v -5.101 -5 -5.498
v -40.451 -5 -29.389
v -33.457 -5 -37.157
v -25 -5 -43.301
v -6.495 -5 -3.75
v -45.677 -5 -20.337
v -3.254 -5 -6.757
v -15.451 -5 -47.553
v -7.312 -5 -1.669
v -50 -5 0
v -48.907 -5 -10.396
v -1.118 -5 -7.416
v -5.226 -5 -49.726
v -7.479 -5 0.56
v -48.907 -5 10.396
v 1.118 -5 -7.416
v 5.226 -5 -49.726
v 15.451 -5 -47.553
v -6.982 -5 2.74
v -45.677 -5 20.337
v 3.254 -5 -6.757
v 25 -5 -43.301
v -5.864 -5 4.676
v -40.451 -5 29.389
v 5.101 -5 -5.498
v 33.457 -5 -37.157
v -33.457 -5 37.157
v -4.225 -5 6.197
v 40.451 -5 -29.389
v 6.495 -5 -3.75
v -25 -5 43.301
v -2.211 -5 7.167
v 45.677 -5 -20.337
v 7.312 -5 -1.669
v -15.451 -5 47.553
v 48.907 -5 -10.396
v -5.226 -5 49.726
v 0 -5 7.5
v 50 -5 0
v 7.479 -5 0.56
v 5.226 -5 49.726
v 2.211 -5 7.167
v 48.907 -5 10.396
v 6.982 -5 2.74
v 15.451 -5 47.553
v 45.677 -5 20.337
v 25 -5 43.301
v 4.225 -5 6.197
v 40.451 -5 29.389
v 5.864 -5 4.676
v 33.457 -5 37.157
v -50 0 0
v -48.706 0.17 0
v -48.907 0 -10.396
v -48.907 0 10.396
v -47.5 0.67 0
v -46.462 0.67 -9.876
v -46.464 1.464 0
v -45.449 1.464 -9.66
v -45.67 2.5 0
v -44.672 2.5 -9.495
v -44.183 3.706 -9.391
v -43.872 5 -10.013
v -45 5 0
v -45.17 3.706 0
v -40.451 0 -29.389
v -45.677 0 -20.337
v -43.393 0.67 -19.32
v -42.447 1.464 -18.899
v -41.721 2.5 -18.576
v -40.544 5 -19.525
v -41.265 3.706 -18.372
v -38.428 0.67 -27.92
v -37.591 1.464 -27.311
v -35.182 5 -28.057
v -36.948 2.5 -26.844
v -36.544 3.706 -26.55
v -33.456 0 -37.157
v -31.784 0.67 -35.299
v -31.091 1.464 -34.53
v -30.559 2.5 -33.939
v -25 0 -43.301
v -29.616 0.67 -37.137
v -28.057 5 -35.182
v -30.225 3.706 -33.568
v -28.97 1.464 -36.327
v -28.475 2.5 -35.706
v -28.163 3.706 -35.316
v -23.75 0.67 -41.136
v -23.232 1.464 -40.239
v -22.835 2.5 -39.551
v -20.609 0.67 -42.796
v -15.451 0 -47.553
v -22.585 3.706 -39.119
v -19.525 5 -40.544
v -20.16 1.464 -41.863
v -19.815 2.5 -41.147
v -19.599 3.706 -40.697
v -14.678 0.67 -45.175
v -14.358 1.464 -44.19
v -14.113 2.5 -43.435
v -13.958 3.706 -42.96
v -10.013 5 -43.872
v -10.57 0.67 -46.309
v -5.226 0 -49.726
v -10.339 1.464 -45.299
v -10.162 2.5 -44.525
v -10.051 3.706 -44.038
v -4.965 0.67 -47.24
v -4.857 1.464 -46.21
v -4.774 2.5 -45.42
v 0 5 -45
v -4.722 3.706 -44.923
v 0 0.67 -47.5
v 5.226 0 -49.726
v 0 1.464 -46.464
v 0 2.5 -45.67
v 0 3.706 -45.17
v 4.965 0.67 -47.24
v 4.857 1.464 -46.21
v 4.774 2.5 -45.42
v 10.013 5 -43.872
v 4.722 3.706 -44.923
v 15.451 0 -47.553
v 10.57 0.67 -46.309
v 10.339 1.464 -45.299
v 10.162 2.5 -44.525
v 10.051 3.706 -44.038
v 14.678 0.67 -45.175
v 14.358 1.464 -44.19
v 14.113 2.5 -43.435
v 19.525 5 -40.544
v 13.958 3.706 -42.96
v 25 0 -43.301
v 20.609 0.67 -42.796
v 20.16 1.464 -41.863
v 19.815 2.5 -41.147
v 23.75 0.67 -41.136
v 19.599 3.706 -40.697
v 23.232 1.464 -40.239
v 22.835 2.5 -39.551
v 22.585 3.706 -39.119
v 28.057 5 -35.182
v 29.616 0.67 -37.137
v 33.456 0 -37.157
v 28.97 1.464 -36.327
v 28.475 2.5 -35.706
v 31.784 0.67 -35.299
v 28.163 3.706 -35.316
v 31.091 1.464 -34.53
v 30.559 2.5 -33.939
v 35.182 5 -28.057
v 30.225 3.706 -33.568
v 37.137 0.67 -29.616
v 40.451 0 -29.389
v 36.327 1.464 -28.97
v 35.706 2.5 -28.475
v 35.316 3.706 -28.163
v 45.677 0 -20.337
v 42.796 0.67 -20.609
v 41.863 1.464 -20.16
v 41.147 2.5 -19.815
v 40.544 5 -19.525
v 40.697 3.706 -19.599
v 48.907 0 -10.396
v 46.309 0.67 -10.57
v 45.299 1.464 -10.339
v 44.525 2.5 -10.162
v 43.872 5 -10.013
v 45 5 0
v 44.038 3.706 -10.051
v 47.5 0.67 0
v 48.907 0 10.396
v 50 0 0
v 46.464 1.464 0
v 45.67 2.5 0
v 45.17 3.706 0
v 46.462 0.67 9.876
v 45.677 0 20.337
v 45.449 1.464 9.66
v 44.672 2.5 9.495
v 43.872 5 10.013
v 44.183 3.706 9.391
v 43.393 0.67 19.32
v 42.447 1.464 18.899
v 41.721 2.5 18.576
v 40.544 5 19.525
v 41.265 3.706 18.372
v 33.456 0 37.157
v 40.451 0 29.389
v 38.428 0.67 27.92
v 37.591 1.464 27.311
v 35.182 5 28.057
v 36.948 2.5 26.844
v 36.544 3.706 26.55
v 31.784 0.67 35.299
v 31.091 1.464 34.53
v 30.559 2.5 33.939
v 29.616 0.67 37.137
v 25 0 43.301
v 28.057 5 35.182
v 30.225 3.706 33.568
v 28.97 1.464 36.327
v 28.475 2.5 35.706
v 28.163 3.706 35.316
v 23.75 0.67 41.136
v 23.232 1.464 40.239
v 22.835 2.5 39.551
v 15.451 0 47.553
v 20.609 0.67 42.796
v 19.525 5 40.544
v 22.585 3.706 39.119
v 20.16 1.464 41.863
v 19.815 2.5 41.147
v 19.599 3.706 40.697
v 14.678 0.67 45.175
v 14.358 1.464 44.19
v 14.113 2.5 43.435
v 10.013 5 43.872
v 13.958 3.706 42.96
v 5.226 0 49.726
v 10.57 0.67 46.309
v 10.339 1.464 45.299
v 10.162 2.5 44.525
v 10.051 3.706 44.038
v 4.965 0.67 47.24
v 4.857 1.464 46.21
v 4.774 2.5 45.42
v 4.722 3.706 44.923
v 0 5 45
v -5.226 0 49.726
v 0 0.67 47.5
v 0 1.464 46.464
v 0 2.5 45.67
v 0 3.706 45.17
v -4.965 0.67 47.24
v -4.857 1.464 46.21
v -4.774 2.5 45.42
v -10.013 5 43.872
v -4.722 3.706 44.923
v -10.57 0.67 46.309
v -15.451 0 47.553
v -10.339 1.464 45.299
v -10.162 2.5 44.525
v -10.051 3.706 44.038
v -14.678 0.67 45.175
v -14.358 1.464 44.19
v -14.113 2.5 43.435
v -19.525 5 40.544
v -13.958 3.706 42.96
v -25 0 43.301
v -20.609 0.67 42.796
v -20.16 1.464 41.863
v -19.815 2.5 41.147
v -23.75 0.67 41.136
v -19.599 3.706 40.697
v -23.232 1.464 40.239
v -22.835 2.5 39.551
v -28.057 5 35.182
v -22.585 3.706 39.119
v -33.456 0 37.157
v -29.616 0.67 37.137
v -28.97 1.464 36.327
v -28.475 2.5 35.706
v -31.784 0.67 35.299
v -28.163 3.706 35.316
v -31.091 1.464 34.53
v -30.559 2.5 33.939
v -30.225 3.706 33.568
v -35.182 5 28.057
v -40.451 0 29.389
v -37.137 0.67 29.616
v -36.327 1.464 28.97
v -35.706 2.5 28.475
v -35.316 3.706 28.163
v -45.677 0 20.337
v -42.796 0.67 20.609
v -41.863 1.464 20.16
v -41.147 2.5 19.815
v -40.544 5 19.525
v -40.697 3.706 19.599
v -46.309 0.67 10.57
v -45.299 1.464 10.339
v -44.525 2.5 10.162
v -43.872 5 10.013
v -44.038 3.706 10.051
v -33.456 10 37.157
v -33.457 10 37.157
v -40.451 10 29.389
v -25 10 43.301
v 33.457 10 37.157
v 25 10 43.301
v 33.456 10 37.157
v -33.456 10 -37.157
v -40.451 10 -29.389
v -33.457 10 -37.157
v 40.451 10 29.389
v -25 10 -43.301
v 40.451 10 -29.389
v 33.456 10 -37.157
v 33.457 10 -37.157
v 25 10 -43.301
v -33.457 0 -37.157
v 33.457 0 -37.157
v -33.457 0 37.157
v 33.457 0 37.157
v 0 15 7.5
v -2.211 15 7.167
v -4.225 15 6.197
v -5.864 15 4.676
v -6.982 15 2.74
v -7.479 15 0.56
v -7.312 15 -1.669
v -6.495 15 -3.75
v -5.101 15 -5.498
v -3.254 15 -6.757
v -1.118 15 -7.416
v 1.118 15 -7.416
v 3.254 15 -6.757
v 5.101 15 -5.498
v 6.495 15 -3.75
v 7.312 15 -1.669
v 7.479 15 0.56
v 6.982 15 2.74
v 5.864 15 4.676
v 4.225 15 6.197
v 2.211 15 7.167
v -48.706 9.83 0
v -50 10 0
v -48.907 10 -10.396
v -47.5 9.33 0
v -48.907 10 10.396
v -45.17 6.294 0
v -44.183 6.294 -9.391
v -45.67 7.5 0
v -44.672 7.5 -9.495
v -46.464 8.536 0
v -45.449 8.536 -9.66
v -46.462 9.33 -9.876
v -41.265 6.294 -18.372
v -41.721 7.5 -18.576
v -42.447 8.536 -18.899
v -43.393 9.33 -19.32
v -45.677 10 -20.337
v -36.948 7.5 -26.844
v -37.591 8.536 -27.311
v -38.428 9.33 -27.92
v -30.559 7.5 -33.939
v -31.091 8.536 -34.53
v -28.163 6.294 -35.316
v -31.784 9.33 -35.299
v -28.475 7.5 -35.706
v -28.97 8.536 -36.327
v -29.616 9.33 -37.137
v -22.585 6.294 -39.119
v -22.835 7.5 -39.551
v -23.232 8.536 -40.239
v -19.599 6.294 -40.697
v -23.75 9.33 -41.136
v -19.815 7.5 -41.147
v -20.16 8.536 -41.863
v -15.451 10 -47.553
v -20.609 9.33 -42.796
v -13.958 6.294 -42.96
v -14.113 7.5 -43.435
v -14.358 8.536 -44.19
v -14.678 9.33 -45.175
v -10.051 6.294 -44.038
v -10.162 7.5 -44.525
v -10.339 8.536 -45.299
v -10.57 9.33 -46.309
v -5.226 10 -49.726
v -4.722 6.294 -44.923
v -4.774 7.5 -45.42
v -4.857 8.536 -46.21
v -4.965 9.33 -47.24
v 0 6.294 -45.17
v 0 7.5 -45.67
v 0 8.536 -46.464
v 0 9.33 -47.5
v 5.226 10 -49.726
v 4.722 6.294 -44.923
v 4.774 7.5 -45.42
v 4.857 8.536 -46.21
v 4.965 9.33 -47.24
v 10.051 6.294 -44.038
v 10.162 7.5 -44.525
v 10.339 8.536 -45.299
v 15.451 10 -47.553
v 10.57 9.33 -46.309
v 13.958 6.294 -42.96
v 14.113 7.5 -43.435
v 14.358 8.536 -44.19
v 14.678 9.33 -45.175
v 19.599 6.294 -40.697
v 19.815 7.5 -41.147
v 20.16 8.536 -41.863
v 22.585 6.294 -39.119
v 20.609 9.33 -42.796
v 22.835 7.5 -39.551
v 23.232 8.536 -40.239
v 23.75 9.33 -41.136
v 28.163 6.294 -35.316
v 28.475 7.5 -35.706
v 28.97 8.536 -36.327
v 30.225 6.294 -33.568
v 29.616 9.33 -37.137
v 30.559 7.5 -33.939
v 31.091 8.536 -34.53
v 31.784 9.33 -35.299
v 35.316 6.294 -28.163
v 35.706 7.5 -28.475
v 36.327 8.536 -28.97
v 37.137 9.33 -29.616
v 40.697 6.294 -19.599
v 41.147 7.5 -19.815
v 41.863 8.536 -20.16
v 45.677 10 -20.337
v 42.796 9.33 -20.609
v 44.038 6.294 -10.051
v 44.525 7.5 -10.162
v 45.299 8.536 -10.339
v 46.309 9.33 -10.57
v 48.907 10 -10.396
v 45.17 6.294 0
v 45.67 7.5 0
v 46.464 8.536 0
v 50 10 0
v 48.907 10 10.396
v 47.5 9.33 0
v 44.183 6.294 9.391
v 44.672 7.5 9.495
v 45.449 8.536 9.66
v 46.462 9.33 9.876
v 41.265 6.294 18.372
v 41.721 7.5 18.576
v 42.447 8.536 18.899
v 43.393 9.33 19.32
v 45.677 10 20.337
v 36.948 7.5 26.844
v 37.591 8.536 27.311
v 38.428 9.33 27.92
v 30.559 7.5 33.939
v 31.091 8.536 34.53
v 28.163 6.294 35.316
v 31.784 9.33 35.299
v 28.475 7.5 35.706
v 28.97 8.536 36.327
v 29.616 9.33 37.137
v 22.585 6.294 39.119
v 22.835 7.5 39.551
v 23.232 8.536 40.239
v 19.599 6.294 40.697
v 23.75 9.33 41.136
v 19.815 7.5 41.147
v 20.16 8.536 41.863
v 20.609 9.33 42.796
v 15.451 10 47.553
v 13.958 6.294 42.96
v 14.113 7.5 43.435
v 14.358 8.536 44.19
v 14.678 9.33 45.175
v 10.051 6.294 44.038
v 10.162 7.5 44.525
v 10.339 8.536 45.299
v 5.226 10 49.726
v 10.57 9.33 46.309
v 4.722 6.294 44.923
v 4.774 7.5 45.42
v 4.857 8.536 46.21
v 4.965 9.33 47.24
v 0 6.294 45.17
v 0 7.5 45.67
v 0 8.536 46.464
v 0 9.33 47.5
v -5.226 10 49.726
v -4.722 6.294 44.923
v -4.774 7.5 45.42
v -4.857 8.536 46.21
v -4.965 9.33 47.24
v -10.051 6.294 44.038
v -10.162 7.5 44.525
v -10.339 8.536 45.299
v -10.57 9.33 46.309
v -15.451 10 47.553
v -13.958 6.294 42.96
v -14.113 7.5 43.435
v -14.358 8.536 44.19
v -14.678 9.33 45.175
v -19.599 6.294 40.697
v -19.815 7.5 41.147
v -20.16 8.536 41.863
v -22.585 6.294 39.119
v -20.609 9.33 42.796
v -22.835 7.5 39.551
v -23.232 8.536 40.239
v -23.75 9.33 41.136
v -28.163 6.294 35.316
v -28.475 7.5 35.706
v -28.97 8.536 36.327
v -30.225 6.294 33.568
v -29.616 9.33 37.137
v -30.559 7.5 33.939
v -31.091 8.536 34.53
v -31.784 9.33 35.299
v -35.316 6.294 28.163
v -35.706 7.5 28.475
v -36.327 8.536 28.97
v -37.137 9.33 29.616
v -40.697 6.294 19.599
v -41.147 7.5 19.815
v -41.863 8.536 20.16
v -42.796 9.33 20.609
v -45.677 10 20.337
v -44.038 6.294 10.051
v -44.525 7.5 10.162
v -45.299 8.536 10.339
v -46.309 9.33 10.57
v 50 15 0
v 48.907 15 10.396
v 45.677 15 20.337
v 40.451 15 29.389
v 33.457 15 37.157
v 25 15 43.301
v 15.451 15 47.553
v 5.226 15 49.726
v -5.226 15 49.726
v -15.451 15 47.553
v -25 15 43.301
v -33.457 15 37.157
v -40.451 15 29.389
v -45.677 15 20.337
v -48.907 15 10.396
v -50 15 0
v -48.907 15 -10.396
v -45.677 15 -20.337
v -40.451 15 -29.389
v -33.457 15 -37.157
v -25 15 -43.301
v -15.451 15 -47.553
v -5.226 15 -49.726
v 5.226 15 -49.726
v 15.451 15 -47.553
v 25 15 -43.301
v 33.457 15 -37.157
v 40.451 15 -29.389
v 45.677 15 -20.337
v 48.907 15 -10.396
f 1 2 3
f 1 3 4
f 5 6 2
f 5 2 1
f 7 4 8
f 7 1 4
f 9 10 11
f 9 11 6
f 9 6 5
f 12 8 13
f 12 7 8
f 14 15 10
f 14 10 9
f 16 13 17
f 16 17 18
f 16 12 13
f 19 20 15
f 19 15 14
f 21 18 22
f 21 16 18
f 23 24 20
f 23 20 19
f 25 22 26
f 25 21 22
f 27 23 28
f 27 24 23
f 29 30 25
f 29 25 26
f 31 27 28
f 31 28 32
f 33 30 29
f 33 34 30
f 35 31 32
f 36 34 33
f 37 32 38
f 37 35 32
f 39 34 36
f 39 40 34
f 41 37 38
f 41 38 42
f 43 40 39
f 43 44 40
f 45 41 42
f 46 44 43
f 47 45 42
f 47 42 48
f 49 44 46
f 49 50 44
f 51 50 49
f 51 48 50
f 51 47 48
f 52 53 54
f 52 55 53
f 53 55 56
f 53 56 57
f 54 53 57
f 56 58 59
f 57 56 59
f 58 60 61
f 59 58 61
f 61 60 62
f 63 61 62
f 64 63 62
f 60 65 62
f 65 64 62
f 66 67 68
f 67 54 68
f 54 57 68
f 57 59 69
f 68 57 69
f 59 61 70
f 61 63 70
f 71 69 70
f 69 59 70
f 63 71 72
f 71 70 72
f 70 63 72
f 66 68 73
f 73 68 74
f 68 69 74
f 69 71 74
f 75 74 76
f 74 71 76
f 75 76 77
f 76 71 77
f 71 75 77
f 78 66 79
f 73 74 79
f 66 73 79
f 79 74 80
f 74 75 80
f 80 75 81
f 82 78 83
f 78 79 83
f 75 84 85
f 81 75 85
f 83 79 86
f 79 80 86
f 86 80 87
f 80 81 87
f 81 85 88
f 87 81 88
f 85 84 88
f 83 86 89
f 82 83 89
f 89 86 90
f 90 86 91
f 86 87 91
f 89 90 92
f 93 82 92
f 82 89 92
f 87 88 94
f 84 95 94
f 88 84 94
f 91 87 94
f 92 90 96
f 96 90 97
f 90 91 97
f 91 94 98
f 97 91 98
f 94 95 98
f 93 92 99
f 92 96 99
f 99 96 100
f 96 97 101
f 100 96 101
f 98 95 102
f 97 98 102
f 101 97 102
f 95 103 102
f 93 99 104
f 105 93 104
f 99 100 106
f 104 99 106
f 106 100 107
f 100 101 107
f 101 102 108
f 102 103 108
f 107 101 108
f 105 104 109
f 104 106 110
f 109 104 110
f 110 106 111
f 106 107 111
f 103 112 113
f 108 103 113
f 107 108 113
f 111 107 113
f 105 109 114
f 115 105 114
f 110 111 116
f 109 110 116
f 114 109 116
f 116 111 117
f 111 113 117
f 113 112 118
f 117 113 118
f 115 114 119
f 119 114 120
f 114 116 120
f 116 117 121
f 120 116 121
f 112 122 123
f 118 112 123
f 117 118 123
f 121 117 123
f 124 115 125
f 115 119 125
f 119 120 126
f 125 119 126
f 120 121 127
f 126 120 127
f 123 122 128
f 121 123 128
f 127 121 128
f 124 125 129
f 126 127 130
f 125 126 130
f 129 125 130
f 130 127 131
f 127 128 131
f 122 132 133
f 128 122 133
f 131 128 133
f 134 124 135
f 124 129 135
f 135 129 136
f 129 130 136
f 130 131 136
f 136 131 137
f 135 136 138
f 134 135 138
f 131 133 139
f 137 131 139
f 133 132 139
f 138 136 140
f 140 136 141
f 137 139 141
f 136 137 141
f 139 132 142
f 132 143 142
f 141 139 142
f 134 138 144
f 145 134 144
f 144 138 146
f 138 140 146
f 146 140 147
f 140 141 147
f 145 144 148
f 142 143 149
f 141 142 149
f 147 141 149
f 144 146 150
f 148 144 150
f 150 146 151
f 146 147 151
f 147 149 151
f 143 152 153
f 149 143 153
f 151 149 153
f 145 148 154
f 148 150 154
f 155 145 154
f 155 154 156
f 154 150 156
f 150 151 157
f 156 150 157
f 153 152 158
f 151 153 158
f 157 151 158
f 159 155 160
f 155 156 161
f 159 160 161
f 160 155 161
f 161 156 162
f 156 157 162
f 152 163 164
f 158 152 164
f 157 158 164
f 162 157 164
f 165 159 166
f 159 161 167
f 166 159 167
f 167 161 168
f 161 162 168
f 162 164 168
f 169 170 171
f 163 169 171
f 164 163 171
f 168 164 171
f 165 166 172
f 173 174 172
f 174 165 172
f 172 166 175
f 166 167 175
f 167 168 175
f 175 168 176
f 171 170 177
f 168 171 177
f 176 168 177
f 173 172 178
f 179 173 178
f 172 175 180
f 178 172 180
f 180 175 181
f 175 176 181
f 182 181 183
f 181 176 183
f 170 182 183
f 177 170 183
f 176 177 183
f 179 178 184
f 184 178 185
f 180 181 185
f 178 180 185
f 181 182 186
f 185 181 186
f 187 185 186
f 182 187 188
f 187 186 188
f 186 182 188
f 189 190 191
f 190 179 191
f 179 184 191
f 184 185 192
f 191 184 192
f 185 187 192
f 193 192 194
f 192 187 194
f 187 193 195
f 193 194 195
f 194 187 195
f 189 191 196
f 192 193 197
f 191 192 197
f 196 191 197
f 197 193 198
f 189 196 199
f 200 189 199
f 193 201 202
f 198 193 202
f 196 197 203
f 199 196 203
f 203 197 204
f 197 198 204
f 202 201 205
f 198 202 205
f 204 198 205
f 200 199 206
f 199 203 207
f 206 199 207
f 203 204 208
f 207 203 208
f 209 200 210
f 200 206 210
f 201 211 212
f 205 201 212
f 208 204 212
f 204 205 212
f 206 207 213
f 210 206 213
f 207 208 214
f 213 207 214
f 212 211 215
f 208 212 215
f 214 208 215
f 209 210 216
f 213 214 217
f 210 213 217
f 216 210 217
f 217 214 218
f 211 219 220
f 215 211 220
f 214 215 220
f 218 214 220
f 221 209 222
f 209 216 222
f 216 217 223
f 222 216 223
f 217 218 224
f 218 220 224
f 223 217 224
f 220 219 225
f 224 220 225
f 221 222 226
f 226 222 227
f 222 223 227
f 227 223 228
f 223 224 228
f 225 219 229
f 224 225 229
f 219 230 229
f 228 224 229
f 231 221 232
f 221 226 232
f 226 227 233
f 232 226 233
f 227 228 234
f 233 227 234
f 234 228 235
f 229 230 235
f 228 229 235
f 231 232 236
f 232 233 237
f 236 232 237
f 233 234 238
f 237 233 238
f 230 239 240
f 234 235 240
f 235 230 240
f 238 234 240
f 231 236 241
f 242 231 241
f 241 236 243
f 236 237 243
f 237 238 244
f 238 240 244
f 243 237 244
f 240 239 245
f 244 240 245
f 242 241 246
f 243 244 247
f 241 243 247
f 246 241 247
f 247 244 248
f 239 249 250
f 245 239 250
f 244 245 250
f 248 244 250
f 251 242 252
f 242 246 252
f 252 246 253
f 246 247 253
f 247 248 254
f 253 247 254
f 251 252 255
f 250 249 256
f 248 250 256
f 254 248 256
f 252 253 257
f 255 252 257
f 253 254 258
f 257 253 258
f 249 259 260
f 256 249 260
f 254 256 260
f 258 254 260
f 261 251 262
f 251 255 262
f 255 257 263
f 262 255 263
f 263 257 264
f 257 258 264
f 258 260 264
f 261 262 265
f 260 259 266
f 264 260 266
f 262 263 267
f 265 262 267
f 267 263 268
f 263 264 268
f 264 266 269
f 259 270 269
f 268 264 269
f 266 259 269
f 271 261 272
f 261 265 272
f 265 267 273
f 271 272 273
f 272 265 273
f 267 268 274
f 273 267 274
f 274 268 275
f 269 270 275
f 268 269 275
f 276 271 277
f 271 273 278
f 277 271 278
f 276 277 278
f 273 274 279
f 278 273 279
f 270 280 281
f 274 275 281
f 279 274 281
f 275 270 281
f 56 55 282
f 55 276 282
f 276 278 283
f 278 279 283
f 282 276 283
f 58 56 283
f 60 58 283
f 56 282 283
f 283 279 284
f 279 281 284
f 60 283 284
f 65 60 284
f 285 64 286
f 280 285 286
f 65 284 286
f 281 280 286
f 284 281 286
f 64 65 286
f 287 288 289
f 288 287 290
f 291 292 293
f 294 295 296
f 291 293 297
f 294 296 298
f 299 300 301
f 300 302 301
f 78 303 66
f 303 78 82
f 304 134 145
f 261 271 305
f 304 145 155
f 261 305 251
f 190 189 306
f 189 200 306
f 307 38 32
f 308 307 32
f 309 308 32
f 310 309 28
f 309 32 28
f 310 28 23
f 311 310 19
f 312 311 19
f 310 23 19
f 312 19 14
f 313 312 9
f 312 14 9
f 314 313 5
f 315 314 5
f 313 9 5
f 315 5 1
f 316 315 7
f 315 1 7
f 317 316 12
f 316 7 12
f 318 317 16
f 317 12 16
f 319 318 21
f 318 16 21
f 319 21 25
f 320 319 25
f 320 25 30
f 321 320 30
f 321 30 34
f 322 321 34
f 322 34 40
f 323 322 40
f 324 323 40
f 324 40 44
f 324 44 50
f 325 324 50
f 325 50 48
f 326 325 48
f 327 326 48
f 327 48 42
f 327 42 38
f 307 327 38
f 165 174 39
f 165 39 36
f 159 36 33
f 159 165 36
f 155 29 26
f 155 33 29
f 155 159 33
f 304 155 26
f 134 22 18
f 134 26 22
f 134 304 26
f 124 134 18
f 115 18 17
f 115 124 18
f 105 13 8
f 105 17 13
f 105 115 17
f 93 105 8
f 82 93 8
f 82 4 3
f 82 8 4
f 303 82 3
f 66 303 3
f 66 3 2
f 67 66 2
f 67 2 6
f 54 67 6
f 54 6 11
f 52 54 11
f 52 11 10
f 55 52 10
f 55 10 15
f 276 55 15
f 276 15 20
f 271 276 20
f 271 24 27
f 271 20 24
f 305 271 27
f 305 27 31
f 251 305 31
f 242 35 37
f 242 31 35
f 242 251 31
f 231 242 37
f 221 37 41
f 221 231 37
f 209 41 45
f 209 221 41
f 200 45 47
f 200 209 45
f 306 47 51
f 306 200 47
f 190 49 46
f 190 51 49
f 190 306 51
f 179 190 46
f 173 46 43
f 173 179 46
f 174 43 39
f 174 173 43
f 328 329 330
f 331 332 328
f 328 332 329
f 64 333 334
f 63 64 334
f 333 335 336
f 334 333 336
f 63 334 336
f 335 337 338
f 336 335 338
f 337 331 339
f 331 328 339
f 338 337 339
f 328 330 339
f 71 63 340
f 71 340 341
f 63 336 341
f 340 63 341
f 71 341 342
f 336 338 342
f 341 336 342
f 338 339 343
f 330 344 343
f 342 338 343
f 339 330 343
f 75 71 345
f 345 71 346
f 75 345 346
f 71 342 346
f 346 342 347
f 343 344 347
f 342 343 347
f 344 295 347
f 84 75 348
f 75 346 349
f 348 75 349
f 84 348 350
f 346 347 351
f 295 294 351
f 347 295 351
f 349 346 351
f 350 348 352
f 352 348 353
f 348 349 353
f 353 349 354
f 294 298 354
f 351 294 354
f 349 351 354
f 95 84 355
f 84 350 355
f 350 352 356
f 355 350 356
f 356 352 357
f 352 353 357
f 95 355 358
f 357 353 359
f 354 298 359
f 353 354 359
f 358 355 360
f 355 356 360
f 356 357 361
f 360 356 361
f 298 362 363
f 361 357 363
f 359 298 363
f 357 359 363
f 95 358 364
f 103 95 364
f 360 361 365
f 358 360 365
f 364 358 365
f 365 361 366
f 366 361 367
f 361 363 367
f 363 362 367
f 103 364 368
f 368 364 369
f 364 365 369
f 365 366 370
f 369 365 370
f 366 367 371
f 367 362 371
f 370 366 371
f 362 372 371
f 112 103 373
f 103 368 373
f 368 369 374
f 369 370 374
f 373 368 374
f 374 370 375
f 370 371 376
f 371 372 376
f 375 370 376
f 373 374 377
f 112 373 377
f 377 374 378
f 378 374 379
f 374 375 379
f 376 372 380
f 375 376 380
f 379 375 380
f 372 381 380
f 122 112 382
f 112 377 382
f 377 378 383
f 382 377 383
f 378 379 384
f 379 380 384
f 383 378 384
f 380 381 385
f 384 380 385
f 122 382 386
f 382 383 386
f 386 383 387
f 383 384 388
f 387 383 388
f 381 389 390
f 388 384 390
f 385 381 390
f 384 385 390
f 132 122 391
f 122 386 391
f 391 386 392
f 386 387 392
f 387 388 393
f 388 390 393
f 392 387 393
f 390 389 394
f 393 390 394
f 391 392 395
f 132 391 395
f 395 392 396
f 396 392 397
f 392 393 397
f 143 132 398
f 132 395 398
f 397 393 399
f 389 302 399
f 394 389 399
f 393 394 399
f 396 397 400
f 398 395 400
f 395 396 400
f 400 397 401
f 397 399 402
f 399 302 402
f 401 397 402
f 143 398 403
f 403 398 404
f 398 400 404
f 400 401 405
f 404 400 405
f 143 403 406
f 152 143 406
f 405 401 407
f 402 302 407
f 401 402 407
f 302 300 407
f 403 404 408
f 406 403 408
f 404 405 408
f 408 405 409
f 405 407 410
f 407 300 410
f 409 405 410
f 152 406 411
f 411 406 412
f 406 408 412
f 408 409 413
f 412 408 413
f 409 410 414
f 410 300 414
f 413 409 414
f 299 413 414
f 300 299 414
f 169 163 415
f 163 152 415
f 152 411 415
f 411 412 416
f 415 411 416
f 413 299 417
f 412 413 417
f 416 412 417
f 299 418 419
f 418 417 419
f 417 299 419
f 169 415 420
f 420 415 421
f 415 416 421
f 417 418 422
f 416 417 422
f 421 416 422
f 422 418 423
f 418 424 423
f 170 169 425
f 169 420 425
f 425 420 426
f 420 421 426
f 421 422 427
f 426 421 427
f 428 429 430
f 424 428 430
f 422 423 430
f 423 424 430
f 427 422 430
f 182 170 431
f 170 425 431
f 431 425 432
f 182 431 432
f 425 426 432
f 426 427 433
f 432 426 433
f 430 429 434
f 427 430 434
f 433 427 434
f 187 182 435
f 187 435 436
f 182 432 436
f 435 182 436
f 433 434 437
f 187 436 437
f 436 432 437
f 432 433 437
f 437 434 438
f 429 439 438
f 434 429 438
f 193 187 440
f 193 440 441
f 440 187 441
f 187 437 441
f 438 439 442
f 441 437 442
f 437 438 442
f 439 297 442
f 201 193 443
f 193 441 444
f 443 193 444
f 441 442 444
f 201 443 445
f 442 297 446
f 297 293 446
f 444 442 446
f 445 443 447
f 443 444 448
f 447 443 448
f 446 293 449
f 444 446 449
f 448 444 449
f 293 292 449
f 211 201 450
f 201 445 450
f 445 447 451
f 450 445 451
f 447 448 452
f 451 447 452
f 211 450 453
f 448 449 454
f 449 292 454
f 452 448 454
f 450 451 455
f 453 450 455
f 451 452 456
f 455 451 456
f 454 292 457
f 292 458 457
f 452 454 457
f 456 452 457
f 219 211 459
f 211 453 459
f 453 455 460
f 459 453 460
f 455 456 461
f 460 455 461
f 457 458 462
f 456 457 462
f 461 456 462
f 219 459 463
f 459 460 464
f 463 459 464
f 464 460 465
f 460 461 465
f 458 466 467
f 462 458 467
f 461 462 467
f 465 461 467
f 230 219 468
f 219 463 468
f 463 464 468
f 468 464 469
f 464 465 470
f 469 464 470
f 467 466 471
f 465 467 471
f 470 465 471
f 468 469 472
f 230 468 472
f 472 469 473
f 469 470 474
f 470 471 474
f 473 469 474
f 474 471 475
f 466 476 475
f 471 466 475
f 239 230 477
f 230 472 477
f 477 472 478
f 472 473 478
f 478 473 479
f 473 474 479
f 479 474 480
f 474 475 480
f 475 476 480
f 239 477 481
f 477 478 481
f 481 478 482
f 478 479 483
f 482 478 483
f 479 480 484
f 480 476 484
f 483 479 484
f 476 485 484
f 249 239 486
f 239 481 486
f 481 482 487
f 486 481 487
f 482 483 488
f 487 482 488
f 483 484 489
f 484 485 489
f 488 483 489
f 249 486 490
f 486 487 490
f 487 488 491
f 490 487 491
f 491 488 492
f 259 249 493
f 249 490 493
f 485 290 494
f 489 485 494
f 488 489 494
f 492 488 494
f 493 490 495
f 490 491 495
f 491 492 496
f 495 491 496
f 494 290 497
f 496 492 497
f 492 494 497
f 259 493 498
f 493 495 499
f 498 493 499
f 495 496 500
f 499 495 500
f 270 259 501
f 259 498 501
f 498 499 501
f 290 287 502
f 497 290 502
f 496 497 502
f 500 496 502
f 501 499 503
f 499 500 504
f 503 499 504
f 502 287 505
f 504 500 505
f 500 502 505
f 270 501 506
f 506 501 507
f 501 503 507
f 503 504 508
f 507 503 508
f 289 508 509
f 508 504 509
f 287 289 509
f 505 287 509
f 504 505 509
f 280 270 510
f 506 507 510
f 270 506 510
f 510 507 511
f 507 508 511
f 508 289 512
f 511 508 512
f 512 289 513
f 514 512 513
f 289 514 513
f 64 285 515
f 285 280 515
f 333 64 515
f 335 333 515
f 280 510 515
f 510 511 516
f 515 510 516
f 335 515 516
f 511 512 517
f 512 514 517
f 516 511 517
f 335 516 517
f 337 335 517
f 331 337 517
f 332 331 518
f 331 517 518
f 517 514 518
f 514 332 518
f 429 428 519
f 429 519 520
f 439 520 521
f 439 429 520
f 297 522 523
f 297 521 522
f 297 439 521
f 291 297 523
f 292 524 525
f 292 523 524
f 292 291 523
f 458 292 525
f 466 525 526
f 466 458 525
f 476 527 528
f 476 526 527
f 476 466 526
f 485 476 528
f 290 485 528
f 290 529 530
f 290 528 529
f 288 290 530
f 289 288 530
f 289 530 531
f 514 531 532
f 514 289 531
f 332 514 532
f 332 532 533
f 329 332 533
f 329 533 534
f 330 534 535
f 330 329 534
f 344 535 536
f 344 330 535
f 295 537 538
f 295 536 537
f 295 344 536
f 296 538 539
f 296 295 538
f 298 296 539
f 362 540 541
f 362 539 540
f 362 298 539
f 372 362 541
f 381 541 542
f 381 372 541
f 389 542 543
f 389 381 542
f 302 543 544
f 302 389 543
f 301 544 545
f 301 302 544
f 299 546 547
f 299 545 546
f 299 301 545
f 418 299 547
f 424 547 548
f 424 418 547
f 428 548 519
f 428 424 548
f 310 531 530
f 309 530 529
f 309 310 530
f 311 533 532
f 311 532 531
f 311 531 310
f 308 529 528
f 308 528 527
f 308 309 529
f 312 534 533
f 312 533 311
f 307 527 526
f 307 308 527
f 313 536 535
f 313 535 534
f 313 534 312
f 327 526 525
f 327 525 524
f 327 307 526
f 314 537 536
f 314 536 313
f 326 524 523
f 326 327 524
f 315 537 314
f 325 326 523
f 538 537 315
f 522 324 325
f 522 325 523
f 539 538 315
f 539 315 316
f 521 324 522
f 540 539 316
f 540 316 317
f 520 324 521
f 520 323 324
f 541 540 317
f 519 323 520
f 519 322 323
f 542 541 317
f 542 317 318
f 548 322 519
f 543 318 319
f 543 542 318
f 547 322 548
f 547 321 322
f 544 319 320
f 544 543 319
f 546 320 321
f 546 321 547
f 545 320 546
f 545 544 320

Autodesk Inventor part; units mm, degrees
ref_plane "YZ Plane" through (0, 0, 0) normal (1, 0, 0) x (0, 1, 0)
ref_plane "XZ Plane" through (0, 0, 0) normal (0, 1, 0) x (-1, 0, 0)
ref_plane "XY Plane" through (0, 0, 0) normal (0, 0, 1) x (1, 0, 0)
sketch "Sketch1" plane through (0, 0, 0) normal (0, 1, 0) x (-1, 0, 0)
  circle A0 centre (0, 0) radius 45
  dimension "d0" = 90
extrude "Extrusion1" add sketch "Sketch1" along normal blind 10
sketch "Sketch3" plane through (0, 10, 0) normal (0, 1, 0) x (1, 0, 0)
  circle A0 centre (0, 0) radius 50
  dimension "d5" = 100
extrude "Extrusion2" add sketch "Sketch3" along normal blind 5
sketch "Sketch4" plane through (0, 0, 0) normal (0, -1, 0) x (1, 0, 0)
  circle A0 centre (0, 0) radius 50
  dimension "d8" = 100
extrude "Extrusion3" add sketch "Sketch4" along normal blind 5
full round fillet "Full Round Fillet1" first side at (0, 0, -46.5023) centre faces at (-7.8142, 6.6667, -44.3163) second side at (0, 10, -46.5023)
sketch "Sketch5" plane through (0, 15, 0) normal (0, 1, 0) x (1, 0, 0)
  point P0 (0, 0)
  point P1 (0, 0)
hole "Hole1" at (0, 15, 0) at (0, 15, 0) direction (0, -1, 0) diameter 15 end through all
thread "Thread1" size "M15x1.5" class "6H" standard "ANSI Metric M Profile" length 51.6
properties part number "pump rotor"
